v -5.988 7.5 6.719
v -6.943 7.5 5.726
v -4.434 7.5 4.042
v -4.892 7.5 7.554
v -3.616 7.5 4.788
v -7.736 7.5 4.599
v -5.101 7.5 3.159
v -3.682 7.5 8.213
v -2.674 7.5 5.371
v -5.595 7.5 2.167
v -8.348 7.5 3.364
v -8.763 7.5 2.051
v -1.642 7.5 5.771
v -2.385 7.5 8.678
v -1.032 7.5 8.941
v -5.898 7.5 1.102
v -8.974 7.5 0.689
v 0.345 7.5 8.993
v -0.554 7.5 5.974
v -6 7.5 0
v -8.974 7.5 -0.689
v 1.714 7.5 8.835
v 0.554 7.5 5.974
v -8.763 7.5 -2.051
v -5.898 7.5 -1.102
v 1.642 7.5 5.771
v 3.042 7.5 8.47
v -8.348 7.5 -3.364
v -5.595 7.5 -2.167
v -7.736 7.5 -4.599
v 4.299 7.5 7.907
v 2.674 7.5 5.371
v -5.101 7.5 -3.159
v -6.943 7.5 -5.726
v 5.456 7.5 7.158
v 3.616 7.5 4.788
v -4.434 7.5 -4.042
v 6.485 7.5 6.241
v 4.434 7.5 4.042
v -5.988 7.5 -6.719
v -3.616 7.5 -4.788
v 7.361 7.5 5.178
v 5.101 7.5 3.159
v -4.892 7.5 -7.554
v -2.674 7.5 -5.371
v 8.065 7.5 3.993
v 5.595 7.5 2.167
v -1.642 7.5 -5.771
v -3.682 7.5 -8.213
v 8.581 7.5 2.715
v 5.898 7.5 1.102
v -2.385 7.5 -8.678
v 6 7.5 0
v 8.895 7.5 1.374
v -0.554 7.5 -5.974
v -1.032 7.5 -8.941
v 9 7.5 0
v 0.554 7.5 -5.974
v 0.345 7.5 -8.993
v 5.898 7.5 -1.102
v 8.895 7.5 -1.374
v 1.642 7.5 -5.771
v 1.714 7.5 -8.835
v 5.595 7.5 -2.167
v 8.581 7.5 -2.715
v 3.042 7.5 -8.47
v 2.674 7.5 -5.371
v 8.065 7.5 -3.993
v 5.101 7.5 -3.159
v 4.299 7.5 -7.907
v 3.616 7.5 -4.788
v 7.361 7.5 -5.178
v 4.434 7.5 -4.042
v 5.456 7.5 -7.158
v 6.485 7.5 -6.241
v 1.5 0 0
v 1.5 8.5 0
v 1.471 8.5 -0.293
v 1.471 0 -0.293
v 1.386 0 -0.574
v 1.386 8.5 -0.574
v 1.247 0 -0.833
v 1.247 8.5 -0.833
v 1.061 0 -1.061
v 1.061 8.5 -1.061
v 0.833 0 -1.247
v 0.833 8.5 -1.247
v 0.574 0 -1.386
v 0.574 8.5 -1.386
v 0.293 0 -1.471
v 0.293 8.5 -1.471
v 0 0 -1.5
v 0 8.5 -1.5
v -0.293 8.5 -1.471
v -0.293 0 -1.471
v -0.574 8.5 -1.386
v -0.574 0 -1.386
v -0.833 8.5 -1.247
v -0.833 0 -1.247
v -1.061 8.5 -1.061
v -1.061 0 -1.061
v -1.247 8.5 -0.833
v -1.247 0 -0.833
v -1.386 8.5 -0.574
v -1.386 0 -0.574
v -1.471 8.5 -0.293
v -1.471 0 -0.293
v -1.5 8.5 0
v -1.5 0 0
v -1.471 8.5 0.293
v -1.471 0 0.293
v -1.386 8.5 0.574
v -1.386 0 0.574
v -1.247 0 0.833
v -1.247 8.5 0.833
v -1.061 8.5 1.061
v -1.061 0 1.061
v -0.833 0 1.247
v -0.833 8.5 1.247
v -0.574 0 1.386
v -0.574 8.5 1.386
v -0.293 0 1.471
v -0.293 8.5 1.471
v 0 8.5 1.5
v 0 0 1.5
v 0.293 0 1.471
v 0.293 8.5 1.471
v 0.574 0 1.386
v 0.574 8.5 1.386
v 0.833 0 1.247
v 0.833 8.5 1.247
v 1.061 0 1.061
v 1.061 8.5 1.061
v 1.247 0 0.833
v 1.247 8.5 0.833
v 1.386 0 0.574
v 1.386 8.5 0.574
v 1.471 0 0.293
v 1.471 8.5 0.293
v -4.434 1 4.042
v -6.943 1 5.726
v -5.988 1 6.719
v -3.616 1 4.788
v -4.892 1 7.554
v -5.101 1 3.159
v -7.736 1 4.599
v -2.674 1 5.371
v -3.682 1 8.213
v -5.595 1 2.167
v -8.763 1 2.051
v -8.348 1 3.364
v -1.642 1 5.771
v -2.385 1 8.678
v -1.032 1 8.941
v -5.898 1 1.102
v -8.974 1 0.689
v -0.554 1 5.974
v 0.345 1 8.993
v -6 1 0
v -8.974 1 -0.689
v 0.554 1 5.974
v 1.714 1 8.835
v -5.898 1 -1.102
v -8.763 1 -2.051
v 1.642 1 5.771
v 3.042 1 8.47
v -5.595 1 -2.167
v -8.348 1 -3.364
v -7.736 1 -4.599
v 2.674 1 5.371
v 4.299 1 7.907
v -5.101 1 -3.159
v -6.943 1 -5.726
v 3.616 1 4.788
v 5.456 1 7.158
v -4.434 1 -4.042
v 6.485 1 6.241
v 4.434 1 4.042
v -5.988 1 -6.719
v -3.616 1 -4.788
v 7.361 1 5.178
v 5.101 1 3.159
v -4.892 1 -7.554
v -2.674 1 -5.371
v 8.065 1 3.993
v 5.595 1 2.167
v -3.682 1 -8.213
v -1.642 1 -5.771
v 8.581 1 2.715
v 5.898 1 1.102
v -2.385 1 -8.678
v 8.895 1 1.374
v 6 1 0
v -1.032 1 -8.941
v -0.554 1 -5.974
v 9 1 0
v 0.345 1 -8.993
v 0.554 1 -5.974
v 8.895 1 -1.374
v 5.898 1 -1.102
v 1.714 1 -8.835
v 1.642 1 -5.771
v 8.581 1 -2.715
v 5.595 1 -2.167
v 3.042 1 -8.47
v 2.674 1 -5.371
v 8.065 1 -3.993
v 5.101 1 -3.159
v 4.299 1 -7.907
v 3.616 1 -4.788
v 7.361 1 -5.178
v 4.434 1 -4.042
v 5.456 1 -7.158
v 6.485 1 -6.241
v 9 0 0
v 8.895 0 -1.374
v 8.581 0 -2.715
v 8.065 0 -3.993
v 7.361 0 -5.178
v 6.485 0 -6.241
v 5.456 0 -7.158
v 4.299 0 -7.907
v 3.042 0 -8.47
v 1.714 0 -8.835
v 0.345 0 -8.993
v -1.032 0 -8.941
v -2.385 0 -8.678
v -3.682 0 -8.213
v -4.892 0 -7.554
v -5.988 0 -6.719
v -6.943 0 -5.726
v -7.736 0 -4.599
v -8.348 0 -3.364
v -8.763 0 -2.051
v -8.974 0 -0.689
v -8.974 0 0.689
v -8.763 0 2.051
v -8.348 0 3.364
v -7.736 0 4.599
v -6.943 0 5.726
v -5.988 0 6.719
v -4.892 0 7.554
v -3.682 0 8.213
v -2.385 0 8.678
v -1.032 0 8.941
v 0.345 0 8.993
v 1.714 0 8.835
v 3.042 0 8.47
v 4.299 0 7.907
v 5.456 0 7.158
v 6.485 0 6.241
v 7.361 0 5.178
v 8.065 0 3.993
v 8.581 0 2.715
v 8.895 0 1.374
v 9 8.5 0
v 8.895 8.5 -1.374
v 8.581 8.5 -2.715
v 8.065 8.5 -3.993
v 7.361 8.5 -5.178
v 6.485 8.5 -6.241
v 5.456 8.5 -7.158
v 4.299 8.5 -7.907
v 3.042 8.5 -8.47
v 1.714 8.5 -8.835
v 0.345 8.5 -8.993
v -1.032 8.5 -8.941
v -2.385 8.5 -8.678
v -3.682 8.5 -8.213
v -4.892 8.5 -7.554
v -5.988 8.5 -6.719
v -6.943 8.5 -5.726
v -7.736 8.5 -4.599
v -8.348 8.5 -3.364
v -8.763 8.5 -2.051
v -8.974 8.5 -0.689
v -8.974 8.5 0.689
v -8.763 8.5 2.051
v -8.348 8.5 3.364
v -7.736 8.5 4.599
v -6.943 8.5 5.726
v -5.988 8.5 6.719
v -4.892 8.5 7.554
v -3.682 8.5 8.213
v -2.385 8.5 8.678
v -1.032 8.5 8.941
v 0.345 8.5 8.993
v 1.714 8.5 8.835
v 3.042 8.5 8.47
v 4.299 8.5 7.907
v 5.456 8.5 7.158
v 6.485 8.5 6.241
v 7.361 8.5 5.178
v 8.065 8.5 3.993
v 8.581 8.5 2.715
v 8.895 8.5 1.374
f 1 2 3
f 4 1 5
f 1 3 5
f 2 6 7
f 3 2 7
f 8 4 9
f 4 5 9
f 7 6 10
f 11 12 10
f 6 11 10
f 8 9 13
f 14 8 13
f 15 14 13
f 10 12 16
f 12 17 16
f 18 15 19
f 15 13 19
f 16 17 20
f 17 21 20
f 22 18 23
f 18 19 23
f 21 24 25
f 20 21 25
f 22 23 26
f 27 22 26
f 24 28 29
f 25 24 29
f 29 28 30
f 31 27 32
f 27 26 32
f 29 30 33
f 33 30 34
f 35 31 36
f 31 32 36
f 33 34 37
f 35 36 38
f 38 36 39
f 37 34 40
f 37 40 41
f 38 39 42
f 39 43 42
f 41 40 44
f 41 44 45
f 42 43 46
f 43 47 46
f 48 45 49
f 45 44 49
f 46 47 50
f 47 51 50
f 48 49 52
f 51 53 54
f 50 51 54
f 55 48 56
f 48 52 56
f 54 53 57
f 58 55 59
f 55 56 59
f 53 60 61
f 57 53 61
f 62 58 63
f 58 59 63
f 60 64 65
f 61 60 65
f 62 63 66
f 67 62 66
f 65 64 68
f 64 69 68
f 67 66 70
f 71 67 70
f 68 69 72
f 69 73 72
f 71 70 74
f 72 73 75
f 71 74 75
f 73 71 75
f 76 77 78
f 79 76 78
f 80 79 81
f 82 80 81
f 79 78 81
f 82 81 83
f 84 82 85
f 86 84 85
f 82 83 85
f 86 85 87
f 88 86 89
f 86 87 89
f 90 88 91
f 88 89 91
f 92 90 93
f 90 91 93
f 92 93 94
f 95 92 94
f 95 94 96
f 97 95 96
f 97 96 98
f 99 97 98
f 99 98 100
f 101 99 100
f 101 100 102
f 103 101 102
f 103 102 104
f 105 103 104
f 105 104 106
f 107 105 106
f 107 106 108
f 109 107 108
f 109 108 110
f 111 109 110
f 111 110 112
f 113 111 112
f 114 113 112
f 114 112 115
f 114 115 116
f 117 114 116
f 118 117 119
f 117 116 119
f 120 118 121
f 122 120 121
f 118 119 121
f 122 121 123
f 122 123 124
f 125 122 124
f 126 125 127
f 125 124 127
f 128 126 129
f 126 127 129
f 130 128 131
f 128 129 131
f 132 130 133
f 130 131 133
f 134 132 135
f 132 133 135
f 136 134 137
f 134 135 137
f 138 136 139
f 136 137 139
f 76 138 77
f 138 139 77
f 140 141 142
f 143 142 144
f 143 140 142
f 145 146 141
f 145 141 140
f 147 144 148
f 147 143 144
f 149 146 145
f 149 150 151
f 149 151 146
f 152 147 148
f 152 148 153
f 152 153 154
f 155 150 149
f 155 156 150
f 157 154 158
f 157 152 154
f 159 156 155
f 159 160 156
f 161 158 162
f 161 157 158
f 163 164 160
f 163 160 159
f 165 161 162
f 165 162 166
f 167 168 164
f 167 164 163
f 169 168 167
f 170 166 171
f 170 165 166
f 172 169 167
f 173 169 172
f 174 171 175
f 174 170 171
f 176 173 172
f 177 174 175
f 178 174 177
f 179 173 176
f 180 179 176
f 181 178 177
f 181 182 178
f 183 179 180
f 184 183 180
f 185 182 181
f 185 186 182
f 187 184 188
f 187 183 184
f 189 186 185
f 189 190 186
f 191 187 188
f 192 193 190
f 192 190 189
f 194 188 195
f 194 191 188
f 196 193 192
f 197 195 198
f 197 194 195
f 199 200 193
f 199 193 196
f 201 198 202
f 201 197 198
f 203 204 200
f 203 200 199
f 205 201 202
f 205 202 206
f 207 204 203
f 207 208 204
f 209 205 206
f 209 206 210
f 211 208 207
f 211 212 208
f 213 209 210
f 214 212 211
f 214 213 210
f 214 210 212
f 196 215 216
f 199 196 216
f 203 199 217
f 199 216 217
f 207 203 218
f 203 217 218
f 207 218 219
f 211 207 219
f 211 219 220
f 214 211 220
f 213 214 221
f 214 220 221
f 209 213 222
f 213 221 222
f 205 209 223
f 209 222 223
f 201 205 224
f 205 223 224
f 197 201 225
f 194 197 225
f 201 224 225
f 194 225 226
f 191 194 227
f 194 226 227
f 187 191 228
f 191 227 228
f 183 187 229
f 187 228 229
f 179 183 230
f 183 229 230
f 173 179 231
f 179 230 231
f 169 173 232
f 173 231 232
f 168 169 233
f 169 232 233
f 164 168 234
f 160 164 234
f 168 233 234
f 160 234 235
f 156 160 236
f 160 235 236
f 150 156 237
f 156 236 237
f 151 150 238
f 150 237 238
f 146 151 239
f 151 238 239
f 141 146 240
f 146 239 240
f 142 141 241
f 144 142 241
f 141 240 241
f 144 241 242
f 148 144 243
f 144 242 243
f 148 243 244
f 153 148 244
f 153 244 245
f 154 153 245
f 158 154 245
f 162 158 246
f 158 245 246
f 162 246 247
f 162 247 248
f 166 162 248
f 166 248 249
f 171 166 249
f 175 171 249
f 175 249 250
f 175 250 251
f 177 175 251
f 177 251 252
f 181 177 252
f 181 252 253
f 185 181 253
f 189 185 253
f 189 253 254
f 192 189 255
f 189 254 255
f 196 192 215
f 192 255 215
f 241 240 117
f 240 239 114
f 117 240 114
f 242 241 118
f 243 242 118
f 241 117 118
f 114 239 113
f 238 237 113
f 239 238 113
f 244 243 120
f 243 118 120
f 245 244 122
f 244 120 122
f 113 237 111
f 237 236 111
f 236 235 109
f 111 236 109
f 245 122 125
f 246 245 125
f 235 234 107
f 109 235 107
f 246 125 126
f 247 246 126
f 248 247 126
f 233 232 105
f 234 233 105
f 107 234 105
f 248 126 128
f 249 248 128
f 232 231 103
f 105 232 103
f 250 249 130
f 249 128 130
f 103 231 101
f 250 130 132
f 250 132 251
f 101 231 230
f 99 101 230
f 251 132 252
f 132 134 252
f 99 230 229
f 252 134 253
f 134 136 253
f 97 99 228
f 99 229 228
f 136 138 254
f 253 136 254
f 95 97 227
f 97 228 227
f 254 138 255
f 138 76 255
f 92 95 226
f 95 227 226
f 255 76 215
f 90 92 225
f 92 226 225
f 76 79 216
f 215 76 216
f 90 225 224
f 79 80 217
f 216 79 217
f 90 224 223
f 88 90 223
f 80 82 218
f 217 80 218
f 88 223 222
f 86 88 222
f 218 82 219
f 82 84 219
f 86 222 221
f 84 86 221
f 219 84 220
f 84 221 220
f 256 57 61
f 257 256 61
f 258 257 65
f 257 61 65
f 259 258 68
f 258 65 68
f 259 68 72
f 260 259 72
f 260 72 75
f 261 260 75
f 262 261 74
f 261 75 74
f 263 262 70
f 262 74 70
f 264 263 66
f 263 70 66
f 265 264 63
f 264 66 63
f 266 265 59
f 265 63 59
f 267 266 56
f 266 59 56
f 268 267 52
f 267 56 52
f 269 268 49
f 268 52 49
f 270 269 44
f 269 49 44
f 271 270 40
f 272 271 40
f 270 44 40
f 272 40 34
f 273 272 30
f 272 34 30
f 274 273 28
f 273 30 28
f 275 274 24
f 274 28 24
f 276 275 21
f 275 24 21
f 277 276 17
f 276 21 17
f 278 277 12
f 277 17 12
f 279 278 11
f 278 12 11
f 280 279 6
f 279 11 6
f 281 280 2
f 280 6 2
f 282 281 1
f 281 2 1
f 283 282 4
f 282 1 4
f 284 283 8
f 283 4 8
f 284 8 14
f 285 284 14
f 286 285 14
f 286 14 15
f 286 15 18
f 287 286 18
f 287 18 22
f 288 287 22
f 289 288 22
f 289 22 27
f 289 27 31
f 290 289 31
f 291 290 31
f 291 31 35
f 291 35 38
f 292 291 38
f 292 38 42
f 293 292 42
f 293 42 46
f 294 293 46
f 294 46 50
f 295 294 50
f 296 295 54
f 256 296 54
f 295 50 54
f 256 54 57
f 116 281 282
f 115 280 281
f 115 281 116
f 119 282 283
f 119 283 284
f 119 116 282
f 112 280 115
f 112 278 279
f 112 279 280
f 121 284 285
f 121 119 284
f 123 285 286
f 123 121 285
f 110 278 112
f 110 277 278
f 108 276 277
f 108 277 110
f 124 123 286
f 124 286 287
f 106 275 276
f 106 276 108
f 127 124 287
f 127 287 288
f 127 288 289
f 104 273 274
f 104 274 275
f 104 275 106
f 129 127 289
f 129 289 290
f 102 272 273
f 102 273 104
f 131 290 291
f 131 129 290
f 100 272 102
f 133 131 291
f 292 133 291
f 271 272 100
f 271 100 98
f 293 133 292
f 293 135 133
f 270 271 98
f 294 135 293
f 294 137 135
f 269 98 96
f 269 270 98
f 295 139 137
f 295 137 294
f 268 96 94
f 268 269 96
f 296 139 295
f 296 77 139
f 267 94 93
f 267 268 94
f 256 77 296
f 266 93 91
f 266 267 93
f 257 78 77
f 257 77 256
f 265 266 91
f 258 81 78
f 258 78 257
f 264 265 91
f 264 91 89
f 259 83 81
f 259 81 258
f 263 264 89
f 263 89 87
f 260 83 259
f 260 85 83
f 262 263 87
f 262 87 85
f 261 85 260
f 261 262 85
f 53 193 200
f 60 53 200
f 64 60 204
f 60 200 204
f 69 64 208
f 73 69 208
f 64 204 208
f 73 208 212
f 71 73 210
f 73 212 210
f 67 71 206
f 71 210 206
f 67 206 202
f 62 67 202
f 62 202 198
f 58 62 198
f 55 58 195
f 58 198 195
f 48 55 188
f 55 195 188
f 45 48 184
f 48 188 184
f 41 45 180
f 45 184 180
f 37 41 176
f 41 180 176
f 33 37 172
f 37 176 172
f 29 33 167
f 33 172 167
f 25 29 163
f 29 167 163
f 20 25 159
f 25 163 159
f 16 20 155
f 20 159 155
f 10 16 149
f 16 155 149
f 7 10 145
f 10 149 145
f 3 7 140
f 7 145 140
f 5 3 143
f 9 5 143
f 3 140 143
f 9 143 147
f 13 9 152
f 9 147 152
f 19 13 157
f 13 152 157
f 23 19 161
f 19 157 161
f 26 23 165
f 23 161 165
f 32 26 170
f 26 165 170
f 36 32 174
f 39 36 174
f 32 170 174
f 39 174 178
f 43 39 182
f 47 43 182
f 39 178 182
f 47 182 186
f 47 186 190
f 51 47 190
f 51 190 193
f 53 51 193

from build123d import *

# Parameters (mm, degrees)
SKETCH_1_R          = 9
EXTRUDE_1_DEPTH     = 1
SKETCH_2_R          = 6
EXTRUDE_2_DEPTH     = 6.5
SKETCH_3_R          = 9
EXTRUDE_3_DEPTH     = 1
SKETCH_4_R          = 1.5
CUT_EXTRUDE_1_DEPTH = 9.5


with BuildPart() as part:
    # 草图1 → 凸台-拉伸1 (new body)
    with BuildSketch(Plane(origin=(0, 0, 0), x_dir=(1, 0, 0), z_dir=(0, 1, 0))):
        Circle(SKETCH_1_R)
    extrude(amount=EXTRUDE_1_DEPTH)

    # 草图2 → 凸台-拉伸2 (add)
    with BuildSketch(Plane(origin=(0, 1, 0), x_dir=(1, 0, 0), z_dir=(0, 1, 0))):
        Circle(SKETCH_2_R)
    extrude(amount=EXTRUDE_2_DEPTH)

    # 草图3 → 凸台-拉伸3 (add)
    with BuildSketch(Plane(origin=(0, 7.5, 0), x_dir=(1, 0, 0), z_dir=(0, 1, 0))):
        Circle(SKETCH_3_R)
    extrude(amount=EXTRUDE_3_DEPTH)

    # 草图4 → 切除-拉伸1 (cut, through all)
    with BuildSketch(Plane(origin=(0, 8.5, 0), x_dir=(1, 0, 0), z_dir=(0, 1, 0))):
        Circle(SKETCH_4_R)
    extrude(amount=-CUT_EXTRUDE_1_DEPTH, mode=Mode.SUBTRACT)


solid = part.part
